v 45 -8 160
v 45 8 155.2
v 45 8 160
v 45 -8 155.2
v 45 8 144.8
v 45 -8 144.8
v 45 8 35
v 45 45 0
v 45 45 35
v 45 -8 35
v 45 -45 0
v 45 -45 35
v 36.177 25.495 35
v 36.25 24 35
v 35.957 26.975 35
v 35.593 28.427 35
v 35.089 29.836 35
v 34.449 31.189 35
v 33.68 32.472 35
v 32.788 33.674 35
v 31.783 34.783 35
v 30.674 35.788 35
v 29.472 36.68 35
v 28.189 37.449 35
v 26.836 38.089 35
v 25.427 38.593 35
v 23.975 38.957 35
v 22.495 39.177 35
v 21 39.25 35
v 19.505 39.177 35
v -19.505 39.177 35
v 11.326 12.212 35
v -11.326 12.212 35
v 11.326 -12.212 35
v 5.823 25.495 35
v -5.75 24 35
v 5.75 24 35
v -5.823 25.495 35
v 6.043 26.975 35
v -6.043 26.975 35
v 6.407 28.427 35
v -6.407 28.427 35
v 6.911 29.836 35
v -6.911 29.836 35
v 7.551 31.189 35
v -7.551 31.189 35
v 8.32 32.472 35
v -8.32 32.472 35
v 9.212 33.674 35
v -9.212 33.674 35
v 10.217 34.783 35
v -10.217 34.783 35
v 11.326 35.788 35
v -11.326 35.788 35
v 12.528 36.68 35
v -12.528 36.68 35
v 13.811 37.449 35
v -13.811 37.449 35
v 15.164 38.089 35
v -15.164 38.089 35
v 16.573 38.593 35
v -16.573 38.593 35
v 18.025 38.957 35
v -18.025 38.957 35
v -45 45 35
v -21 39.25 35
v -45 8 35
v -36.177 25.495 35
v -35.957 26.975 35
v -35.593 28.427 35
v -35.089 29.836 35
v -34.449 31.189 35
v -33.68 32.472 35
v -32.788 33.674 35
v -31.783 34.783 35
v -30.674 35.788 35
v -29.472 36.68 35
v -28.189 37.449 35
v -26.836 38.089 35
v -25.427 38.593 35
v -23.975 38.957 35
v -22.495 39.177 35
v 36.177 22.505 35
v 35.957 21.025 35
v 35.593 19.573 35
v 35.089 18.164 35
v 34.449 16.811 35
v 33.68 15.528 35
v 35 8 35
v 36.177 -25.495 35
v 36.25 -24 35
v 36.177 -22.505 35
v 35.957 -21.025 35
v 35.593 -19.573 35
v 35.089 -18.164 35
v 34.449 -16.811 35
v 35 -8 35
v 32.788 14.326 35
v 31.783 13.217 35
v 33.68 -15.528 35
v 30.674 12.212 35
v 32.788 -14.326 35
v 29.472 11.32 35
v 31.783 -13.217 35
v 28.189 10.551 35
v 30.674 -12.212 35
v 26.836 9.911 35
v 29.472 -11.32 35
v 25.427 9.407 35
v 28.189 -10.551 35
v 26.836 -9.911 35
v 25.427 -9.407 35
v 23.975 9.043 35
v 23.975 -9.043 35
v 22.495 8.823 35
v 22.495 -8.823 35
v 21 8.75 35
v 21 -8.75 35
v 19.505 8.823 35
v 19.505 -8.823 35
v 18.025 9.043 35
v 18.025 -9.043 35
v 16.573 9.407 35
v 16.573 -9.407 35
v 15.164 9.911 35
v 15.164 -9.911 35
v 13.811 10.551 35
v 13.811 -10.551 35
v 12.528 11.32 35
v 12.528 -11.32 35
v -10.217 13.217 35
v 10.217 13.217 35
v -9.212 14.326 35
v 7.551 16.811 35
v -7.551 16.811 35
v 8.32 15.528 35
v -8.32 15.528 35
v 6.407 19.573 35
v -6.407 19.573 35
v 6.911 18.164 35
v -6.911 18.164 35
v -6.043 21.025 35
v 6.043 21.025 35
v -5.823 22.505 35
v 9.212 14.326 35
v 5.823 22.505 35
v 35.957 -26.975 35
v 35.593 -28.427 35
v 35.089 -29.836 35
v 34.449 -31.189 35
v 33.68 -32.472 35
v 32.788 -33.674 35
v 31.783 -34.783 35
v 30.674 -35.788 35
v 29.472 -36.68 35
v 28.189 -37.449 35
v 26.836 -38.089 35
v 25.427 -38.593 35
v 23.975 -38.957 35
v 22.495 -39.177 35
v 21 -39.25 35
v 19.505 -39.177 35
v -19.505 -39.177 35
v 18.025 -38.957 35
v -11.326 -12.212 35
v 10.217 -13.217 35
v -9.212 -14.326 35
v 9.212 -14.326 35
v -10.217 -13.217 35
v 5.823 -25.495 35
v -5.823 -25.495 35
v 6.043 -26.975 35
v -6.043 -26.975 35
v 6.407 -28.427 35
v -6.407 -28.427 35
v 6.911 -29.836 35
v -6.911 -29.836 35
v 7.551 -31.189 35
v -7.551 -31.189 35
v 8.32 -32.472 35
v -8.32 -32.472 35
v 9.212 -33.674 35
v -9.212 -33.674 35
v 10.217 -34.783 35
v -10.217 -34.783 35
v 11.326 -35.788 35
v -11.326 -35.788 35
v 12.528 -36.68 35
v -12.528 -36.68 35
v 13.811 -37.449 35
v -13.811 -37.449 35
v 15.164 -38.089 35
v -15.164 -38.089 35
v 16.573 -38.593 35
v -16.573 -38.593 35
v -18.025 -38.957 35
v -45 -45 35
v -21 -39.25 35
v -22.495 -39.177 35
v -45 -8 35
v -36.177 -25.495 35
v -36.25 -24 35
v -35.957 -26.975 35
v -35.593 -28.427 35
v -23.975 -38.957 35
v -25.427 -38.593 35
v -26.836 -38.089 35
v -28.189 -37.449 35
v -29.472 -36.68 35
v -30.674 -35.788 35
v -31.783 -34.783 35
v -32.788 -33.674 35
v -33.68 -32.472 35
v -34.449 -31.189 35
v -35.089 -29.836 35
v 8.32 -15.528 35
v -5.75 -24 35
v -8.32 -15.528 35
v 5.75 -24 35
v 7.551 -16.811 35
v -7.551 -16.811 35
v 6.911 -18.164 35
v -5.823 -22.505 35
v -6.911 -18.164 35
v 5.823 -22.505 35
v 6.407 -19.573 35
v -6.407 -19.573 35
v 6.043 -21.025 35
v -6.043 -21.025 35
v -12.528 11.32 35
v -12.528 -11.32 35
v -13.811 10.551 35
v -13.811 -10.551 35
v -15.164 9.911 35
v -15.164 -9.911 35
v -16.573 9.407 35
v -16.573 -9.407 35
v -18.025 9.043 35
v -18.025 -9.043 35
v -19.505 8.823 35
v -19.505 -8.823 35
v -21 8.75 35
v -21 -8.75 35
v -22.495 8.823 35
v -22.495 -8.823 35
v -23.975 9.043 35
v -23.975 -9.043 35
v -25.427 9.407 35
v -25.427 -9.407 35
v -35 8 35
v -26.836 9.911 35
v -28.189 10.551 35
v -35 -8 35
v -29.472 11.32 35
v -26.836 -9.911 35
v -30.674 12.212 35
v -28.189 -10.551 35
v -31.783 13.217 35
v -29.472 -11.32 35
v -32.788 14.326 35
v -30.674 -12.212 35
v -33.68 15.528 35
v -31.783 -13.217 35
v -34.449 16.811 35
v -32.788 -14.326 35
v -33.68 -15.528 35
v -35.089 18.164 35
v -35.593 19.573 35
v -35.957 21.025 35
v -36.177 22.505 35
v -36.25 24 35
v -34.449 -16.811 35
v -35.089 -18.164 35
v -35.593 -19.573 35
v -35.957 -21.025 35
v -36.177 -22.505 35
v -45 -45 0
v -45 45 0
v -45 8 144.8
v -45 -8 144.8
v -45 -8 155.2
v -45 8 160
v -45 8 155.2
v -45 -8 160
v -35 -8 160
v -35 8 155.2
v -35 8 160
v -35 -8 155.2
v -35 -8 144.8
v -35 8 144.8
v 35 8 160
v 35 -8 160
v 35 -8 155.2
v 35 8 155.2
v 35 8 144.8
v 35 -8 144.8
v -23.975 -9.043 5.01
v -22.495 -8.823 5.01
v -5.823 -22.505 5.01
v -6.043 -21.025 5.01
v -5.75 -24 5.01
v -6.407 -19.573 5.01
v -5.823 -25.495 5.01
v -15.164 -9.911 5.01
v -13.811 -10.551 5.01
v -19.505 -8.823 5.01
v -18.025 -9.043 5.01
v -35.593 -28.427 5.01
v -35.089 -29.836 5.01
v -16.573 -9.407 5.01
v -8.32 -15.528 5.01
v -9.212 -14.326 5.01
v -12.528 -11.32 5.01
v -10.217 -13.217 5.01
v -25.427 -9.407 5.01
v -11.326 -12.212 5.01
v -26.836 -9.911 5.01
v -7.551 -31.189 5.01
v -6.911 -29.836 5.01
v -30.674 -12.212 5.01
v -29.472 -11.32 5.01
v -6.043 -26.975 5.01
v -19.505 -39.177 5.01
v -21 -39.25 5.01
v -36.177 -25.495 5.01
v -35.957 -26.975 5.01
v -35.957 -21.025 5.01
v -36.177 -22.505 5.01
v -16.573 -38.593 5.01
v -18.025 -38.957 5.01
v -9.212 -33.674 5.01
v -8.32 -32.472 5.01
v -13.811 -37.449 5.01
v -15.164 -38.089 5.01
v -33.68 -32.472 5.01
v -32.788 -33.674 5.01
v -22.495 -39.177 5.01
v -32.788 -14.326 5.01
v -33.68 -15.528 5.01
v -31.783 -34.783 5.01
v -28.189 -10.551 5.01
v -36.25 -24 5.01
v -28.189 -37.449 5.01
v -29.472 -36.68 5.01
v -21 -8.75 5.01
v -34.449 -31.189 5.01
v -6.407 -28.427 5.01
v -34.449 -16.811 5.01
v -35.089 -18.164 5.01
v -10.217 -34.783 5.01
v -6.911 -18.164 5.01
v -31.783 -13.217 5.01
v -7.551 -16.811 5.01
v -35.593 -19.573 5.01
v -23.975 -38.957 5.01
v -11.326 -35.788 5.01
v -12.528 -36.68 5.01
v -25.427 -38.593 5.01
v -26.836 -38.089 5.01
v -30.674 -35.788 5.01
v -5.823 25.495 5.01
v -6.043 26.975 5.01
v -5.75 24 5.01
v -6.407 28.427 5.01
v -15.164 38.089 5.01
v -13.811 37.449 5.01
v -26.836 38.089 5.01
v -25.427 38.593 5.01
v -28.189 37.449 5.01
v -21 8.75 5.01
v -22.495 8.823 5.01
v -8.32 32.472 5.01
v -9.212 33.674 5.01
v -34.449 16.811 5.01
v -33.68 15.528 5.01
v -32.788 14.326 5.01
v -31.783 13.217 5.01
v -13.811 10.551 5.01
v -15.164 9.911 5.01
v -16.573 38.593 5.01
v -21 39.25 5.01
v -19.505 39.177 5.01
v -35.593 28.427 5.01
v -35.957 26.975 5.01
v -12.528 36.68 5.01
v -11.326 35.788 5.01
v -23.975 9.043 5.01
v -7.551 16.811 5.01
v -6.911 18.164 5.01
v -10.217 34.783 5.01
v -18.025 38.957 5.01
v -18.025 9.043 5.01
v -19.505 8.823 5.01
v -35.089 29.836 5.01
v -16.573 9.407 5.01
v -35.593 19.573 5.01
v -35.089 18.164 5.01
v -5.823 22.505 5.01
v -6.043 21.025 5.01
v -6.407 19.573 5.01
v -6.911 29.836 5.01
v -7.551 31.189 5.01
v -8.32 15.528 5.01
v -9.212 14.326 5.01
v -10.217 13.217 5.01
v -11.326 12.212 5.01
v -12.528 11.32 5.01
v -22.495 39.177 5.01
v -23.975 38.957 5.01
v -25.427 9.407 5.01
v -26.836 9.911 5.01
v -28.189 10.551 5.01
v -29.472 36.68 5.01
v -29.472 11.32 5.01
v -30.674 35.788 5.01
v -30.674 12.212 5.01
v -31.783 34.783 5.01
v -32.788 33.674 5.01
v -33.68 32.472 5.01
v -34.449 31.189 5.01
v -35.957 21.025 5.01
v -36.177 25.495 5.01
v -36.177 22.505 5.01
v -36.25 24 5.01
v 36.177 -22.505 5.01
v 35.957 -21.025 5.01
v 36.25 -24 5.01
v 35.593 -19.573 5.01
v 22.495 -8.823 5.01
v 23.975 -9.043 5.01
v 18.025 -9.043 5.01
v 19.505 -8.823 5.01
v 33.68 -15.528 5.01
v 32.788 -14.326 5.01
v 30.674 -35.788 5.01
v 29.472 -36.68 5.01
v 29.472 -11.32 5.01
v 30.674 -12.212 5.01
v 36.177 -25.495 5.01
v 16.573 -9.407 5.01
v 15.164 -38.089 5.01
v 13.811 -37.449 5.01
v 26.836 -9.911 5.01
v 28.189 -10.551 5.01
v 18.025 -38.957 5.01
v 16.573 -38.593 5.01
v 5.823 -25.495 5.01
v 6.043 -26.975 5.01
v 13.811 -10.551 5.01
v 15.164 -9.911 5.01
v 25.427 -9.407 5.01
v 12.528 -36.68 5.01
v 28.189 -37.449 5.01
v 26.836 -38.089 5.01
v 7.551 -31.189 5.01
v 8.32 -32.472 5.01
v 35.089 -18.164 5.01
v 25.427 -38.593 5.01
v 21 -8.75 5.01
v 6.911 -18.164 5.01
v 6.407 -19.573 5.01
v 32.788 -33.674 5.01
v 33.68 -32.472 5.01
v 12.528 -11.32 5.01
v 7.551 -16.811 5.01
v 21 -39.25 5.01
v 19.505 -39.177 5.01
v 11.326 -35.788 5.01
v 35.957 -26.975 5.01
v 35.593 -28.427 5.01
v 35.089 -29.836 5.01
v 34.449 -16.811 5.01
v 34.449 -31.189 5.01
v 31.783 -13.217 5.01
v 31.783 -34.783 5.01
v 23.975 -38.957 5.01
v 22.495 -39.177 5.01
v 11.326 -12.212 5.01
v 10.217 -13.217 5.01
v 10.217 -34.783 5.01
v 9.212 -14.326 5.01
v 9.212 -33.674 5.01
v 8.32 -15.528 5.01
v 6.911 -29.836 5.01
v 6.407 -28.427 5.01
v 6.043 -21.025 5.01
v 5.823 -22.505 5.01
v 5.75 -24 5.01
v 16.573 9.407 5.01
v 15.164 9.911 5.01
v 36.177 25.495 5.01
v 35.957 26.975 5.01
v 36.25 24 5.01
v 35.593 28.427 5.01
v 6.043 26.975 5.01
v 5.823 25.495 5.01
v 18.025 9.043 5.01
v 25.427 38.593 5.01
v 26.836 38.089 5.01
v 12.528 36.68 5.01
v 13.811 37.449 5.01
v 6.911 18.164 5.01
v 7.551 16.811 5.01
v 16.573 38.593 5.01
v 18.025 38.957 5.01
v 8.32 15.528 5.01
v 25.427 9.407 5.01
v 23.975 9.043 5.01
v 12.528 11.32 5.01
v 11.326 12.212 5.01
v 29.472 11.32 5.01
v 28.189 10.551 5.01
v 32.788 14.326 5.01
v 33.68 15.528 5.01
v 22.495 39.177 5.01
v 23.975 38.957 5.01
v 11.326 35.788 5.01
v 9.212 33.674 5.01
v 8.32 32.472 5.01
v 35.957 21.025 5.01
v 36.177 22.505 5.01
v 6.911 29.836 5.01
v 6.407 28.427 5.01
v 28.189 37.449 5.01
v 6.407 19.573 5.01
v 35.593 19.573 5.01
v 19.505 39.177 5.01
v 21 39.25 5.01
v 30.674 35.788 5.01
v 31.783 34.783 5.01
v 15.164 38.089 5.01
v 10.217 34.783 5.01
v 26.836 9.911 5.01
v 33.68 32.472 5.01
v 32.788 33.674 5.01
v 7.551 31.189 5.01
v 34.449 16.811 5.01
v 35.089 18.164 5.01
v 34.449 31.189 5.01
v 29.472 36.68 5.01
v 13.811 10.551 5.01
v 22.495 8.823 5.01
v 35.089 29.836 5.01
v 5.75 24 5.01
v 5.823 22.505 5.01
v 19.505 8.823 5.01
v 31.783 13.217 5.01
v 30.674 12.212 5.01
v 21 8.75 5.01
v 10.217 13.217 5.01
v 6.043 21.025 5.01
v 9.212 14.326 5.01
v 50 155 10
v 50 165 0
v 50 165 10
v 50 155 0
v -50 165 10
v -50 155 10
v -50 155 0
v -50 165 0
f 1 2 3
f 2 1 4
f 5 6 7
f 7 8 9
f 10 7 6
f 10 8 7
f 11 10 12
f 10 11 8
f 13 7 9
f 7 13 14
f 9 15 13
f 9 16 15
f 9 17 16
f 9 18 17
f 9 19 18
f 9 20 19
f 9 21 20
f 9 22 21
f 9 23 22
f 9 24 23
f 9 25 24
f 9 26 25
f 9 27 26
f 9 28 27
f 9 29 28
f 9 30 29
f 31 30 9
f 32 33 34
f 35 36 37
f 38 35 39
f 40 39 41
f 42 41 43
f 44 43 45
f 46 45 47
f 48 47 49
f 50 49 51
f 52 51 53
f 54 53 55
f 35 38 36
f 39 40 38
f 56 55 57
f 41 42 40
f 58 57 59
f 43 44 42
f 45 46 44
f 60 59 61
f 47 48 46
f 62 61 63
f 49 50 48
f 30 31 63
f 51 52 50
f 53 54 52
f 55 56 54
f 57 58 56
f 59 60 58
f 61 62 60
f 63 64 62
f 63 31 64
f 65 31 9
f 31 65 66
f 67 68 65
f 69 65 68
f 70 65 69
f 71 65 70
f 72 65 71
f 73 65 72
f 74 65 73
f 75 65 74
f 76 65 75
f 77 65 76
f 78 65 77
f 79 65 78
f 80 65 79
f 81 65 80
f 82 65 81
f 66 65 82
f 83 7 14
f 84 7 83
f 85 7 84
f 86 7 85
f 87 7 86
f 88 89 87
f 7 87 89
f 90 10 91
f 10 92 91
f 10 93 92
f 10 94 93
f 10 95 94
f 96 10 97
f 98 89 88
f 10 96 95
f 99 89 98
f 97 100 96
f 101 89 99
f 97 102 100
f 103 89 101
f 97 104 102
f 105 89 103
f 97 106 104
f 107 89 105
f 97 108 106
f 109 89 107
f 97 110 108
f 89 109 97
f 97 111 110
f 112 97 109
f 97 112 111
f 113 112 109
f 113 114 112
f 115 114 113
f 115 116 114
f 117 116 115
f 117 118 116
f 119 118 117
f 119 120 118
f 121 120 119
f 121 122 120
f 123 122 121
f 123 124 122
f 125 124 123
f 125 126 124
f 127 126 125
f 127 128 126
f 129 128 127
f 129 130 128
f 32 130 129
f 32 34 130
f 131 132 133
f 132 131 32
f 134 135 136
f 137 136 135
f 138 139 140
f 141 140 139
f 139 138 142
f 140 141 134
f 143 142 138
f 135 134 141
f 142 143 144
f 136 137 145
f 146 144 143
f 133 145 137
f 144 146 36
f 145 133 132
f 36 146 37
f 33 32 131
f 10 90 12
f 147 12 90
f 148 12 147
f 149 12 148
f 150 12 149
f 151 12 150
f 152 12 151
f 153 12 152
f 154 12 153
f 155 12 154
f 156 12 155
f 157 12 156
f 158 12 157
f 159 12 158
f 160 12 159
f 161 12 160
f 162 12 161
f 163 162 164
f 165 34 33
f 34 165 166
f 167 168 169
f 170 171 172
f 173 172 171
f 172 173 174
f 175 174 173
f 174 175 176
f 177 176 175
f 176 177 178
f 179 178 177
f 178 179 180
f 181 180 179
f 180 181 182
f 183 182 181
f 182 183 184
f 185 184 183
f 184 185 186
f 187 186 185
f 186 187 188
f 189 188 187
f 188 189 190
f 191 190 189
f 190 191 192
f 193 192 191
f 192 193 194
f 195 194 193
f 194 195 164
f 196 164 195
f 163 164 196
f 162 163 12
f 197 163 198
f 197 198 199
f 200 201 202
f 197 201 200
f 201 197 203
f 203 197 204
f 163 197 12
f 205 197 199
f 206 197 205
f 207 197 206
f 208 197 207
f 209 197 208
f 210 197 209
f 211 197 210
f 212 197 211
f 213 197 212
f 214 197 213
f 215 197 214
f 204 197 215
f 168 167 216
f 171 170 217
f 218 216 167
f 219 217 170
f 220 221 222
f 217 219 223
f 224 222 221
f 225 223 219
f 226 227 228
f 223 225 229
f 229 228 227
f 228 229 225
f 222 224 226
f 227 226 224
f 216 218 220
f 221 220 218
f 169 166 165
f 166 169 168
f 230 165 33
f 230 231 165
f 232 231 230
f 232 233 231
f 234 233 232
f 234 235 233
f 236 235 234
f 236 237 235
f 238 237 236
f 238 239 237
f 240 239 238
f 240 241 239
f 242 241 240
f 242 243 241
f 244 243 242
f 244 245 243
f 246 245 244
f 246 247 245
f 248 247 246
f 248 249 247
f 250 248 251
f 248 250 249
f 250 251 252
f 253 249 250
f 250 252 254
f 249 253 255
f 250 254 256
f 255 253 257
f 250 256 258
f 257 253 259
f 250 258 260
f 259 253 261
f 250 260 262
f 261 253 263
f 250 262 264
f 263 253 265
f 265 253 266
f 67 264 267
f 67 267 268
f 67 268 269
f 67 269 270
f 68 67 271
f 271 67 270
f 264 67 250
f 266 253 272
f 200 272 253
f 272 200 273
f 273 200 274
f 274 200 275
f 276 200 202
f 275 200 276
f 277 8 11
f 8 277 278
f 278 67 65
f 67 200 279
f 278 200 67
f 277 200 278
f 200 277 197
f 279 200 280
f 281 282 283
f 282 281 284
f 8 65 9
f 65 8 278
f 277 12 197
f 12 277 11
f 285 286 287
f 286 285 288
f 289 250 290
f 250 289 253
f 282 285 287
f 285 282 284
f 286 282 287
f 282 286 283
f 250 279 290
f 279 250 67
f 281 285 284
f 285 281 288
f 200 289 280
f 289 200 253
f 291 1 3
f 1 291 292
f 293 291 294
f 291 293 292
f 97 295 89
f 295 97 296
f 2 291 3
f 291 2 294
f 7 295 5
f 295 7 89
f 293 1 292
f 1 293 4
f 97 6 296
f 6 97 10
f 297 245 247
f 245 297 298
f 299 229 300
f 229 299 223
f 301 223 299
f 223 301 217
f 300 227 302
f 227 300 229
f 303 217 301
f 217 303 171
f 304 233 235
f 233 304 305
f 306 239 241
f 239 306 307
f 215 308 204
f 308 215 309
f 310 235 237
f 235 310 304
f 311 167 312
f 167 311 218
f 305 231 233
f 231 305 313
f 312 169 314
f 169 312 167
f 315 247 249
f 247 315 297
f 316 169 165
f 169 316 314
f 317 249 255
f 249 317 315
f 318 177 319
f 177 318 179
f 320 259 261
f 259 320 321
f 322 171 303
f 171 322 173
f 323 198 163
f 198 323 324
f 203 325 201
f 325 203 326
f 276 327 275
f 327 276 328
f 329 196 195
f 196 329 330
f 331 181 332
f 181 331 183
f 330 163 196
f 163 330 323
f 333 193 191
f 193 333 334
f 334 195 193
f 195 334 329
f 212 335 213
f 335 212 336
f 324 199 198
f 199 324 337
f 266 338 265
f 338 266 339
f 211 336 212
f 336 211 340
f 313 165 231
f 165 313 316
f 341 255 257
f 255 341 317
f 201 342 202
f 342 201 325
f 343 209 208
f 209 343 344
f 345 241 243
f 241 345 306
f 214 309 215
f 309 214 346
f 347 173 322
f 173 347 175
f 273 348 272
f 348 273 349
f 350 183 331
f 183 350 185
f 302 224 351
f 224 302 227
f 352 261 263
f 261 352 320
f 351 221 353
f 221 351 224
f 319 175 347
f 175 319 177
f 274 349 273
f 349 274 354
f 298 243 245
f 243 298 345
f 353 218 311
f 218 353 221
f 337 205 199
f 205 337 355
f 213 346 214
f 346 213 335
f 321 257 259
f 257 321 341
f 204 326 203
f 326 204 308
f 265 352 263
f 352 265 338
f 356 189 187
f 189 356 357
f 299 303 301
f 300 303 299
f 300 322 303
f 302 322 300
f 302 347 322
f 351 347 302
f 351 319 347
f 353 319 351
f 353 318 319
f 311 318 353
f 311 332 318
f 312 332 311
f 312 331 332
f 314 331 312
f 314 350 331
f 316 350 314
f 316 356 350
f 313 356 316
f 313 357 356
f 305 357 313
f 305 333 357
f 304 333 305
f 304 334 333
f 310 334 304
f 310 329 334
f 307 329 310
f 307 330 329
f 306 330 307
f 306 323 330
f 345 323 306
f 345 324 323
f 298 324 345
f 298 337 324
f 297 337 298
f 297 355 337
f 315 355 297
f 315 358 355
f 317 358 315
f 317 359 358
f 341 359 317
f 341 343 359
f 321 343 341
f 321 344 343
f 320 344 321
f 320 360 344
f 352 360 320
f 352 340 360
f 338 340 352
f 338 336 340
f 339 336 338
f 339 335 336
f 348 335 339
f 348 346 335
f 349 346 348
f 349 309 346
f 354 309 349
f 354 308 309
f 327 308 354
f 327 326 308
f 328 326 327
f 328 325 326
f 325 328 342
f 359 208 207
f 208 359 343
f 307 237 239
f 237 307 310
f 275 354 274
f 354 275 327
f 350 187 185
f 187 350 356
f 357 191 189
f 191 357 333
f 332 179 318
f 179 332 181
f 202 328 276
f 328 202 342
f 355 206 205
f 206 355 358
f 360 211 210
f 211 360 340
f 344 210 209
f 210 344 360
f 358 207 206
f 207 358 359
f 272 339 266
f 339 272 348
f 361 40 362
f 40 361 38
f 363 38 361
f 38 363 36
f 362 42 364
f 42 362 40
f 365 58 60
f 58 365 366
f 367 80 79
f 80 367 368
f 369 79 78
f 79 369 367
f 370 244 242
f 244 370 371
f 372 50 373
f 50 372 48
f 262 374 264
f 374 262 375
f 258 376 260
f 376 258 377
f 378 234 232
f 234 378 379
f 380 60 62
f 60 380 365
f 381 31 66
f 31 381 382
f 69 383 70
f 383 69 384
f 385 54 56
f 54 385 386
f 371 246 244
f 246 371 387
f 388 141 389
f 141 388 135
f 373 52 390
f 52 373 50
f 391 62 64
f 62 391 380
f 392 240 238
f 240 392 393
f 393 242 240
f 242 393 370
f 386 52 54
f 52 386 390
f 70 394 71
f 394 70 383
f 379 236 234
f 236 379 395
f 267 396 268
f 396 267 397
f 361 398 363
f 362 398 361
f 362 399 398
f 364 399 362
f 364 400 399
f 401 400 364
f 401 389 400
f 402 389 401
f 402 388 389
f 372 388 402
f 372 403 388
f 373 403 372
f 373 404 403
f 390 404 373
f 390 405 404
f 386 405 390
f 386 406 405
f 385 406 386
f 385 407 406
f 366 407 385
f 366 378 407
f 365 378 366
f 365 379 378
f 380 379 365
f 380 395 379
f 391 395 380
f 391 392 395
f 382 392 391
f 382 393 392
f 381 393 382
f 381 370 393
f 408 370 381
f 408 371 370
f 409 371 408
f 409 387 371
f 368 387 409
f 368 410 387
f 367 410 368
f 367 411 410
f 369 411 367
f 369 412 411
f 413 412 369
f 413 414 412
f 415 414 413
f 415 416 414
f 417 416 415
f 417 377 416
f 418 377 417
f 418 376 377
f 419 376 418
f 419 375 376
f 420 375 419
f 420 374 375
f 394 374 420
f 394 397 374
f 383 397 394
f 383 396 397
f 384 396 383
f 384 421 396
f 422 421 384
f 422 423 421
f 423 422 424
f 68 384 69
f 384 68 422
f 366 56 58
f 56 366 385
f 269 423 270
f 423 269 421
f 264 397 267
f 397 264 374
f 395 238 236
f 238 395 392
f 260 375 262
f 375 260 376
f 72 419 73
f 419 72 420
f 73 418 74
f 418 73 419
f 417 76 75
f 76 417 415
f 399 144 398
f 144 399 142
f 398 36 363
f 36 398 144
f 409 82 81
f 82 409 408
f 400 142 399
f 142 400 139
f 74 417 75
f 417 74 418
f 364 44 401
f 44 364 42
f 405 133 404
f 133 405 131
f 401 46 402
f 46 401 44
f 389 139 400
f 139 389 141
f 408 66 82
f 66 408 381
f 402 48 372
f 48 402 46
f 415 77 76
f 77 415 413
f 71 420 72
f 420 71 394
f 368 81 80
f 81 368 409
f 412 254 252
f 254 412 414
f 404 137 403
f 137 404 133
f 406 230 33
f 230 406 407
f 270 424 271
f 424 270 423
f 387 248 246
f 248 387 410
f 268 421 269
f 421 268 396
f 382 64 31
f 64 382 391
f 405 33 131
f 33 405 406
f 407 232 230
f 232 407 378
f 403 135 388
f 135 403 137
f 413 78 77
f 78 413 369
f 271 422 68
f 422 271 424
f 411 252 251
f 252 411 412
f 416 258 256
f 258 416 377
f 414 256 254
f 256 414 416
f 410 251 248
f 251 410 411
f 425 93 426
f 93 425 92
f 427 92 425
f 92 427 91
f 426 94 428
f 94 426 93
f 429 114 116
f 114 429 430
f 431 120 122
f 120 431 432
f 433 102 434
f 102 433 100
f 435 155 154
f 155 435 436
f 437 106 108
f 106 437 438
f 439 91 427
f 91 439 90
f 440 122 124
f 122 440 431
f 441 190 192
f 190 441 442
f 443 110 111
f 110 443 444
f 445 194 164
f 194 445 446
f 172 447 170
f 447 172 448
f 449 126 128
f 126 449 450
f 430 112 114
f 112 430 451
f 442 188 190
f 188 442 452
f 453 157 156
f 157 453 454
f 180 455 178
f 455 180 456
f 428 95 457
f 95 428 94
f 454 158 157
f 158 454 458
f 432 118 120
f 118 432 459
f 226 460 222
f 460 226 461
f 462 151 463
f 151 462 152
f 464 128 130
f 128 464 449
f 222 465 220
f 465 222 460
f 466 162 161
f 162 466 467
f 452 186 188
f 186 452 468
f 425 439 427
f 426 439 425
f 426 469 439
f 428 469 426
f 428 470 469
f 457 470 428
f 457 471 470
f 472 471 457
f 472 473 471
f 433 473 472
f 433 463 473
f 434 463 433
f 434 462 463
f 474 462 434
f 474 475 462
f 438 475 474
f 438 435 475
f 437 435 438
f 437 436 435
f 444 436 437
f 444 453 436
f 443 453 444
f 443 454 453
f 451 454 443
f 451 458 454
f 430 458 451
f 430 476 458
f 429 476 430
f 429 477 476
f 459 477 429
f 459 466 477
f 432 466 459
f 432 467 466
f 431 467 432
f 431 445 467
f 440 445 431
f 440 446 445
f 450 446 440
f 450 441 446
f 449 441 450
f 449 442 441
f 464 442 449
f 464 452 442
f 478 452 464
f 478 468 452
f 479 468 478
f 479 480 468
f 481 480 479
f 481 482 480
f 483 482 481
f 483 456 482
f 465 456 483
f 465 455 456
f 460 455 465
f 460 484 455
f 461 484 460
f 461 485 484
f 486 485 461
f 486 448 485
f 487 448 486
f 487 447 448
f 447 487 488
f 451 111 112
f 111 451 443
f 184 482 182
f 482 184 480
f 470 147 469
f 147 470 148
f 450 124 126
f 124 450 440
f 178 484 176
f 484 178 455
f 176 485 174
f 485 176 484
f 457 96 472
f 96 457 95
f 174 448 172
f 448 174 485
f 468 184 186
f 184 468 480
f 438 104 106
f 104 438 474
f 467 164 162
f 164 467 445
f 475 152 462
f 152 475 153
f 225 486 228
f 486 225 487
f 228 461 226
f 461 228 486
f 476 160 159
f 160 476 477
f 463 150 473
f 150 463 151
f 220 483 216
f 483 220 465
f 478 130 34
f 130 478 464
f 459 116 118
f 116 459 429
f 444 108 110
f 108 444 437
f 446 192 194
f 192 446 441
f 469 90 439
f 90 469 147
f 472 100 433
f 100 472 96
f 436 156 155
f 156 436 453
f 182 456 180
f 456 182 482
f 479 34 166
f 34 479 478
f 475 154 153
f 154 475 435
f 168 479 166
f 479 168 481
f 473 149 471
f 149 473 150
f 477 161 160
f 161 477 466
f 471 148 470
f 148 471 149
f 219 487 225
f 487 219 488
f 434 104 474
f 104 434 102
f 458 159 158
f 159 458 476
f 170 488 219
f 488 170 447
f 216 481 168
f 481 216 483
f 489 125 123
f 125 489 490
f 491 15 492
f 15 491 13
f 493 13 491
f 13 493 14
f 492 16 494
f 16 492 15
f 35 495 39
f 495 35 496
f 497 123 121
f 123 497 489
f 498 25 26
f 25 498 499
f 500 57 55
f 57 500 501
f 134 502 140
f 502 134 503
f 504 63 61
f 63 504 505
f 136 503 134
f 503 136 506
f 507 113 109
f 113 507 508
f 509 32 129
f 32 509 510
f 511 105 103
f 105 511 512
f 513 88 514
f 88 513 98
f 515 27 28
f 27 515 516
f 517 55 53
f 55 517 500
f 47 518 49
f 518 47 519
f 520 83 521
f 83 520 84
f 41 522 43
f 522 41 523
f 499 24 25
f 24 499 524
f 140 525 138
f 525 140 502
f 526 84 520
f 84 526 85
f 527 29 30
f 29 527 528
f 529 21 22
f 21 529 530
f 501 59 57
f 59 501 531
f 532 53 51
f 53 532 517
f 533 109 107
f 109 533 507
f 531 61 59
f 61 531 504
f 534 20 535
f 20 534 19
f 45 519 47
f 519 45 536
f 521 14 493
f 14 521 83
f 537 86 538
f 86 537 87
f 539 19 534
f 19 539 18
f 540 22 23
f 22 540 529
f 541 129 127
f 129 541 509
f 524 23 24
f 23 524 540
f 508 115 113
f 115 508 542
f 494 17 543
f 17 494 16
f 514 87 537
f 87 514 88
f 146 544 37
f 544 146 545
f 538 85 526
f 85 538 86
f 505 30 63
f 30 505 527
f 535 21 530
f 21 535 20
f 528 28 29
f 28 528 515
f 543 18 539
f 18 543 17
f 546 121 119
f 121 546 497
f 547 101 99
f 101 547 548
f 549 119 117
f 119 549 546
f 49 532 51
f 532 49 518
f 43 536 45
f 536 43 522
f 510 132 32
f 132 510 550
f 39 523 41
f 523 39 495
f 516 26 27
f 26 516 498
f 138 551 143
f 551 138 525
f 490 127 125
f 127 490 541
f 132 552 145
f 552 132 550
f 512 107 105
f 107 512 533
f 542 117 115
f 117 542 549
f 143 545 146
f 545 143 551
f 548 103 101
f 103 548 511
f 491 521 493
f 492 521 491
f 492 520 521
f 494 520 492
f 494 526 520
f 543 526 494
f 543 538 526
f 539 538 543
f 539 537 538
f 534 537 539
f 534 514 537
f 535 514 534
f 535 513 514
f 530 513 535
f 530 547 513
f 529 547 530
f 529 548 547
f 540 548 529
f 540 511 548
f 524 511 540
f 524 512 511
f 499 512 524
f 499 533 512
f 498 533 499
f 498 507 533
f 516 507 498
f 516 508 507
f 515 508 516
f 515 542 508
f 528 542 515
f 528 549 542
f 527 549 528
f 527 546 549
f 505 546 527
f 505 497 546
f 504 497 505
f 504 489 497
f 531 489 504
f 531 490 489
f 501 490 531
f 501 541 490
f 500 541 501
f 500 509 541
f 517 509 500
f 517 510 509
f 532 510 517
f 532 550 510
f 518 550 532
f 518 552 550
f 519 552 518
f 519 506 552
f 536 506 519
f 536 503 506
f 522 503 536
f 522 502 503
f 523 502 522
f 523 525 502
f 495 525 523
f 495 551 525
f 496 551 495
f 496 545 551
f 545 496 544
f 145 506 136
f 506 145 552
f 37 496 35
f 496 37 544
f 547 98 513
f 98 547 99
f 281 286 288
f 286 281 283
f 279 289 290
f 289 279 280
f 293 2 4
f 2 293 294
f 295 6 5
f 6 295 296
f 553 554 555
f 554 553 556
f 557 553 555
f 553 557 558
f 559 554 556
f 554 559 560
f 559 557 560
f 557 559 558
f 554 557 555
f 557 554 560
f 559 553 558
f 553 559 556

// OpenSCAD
// Part 1: Base block with tube seats and vertical posts
// Part 2: Handle bar to be slid through the posts

// --- DIMENSIONS PART 1 ---
base_x      = 90.0;    // Base length (X)
base_y      = 90.0;    // Base width (Y)
base_z      = 35.0;    // Base height (Z)

seat_d      = 30.5;    // Diameter of tube seat
seat_depth  = 30.0;    // Depth of tube seat
seat_floor  = 5.0;     // Remaining floor thickness (35 - 30)

post_x_thick = 10.0;   // Thickness of post along X
post_y_wide  = 16.0;   // Width of post along Y
post_z_top   = 160.0;  // Top surface of post at Z=160

hole_sq_d    = 10.4;   // Square hole dimension (X-axis through post)
hole_sq_z    = 150.0;  // Z-height of the square hole center

// --- DIMENSIONS PART 2 ---
handle_x     = 100.0;  // Length of handle (X)
handle_w     = 10.0;   // Width of handle (Y)
handle_h     = 10.0;   // Height of handle (Z)
handle_y_min  = 55.0;  // Y-position start (55 to 65)
handle_y_max  = 65.0;  // Y-position end

// --- CONSTANTS ---
$fn = 64;

// --- PART 1: BASE AND POSTS ---
module part_1() {
    difference() {
        union() {
            // The Base Block
            translate([-base_x/2, -base_y/2, 0])
                cube([base_x, base_y, base_z]);

            // Post 1 (at -X end)
            // Positioned flush with end face (-45) and centered on Y
            translate([-base_x/2, -post_y_wide/2, base_z])
                cube([post_x_thick, post_y_wide, post_z_top - base_z]);

            // Post 2 (at +X end)
            // Positioned flush with end face (+45) and centered on Y
            translate([base_x/2 - post_x_thick, -post_y_wide/2, base_z])
                cube([post_x_thick, post_y_wide, post_z_top - base_z]);
        }

        // Tube Seats (Blind holes)
        // Centers: x = -21, 21; y = -24, 24
        for (sx = [-21, 21], sy = [-24, 24]) {
            translate([sx, sy, base_z - seat_depth + 0.01])
                cylinder(h = seat_depth + 0.1, d = seat_d);
        }

        // Square holes through posts
        // The hole is centered at z = 150. 
        // It is a square 10.4 x 10.4.
        // It goes "straight through it along X".
        // We only subtract from the posts.
        
        // Hole in Post 1
        translate([-base_x/2 - 1, -post_y_wide/2 - 1, hole_sq_z - hole_sq_d/2])
            cube([post_x_thick + 2, post_y_wide + 2, hole_sq_d]);
            
        // Hole in Post 2
        translate([base_x/2 - post_x_thick - 1, -post_y_wide/2 - 1, hole_sq_z - hole_sq_d/2])
            cube([post_x_thick + 2, post_y_wide + 2, hole_sq_d]);
    }
}

// --- PART 2: HANDLE ---
module part_2() {
    // The handle is a 10x10 bar, 100mm long.
    // It lies on the bed (Z=0) along X.
    // It spans Y from 55 to 65.
    // Centered on X means X goes from -50 to 50.
    translate([-handle_x/2, handle_y_min, 0])
        cube([handle_x, handle_w, handle_h]);
}

// --- RENDERING ---
// Render Part 1
part_1();

// Render Part 2 (Offset for visibility in preview)
translate([0, 100, 0]) part_2();
